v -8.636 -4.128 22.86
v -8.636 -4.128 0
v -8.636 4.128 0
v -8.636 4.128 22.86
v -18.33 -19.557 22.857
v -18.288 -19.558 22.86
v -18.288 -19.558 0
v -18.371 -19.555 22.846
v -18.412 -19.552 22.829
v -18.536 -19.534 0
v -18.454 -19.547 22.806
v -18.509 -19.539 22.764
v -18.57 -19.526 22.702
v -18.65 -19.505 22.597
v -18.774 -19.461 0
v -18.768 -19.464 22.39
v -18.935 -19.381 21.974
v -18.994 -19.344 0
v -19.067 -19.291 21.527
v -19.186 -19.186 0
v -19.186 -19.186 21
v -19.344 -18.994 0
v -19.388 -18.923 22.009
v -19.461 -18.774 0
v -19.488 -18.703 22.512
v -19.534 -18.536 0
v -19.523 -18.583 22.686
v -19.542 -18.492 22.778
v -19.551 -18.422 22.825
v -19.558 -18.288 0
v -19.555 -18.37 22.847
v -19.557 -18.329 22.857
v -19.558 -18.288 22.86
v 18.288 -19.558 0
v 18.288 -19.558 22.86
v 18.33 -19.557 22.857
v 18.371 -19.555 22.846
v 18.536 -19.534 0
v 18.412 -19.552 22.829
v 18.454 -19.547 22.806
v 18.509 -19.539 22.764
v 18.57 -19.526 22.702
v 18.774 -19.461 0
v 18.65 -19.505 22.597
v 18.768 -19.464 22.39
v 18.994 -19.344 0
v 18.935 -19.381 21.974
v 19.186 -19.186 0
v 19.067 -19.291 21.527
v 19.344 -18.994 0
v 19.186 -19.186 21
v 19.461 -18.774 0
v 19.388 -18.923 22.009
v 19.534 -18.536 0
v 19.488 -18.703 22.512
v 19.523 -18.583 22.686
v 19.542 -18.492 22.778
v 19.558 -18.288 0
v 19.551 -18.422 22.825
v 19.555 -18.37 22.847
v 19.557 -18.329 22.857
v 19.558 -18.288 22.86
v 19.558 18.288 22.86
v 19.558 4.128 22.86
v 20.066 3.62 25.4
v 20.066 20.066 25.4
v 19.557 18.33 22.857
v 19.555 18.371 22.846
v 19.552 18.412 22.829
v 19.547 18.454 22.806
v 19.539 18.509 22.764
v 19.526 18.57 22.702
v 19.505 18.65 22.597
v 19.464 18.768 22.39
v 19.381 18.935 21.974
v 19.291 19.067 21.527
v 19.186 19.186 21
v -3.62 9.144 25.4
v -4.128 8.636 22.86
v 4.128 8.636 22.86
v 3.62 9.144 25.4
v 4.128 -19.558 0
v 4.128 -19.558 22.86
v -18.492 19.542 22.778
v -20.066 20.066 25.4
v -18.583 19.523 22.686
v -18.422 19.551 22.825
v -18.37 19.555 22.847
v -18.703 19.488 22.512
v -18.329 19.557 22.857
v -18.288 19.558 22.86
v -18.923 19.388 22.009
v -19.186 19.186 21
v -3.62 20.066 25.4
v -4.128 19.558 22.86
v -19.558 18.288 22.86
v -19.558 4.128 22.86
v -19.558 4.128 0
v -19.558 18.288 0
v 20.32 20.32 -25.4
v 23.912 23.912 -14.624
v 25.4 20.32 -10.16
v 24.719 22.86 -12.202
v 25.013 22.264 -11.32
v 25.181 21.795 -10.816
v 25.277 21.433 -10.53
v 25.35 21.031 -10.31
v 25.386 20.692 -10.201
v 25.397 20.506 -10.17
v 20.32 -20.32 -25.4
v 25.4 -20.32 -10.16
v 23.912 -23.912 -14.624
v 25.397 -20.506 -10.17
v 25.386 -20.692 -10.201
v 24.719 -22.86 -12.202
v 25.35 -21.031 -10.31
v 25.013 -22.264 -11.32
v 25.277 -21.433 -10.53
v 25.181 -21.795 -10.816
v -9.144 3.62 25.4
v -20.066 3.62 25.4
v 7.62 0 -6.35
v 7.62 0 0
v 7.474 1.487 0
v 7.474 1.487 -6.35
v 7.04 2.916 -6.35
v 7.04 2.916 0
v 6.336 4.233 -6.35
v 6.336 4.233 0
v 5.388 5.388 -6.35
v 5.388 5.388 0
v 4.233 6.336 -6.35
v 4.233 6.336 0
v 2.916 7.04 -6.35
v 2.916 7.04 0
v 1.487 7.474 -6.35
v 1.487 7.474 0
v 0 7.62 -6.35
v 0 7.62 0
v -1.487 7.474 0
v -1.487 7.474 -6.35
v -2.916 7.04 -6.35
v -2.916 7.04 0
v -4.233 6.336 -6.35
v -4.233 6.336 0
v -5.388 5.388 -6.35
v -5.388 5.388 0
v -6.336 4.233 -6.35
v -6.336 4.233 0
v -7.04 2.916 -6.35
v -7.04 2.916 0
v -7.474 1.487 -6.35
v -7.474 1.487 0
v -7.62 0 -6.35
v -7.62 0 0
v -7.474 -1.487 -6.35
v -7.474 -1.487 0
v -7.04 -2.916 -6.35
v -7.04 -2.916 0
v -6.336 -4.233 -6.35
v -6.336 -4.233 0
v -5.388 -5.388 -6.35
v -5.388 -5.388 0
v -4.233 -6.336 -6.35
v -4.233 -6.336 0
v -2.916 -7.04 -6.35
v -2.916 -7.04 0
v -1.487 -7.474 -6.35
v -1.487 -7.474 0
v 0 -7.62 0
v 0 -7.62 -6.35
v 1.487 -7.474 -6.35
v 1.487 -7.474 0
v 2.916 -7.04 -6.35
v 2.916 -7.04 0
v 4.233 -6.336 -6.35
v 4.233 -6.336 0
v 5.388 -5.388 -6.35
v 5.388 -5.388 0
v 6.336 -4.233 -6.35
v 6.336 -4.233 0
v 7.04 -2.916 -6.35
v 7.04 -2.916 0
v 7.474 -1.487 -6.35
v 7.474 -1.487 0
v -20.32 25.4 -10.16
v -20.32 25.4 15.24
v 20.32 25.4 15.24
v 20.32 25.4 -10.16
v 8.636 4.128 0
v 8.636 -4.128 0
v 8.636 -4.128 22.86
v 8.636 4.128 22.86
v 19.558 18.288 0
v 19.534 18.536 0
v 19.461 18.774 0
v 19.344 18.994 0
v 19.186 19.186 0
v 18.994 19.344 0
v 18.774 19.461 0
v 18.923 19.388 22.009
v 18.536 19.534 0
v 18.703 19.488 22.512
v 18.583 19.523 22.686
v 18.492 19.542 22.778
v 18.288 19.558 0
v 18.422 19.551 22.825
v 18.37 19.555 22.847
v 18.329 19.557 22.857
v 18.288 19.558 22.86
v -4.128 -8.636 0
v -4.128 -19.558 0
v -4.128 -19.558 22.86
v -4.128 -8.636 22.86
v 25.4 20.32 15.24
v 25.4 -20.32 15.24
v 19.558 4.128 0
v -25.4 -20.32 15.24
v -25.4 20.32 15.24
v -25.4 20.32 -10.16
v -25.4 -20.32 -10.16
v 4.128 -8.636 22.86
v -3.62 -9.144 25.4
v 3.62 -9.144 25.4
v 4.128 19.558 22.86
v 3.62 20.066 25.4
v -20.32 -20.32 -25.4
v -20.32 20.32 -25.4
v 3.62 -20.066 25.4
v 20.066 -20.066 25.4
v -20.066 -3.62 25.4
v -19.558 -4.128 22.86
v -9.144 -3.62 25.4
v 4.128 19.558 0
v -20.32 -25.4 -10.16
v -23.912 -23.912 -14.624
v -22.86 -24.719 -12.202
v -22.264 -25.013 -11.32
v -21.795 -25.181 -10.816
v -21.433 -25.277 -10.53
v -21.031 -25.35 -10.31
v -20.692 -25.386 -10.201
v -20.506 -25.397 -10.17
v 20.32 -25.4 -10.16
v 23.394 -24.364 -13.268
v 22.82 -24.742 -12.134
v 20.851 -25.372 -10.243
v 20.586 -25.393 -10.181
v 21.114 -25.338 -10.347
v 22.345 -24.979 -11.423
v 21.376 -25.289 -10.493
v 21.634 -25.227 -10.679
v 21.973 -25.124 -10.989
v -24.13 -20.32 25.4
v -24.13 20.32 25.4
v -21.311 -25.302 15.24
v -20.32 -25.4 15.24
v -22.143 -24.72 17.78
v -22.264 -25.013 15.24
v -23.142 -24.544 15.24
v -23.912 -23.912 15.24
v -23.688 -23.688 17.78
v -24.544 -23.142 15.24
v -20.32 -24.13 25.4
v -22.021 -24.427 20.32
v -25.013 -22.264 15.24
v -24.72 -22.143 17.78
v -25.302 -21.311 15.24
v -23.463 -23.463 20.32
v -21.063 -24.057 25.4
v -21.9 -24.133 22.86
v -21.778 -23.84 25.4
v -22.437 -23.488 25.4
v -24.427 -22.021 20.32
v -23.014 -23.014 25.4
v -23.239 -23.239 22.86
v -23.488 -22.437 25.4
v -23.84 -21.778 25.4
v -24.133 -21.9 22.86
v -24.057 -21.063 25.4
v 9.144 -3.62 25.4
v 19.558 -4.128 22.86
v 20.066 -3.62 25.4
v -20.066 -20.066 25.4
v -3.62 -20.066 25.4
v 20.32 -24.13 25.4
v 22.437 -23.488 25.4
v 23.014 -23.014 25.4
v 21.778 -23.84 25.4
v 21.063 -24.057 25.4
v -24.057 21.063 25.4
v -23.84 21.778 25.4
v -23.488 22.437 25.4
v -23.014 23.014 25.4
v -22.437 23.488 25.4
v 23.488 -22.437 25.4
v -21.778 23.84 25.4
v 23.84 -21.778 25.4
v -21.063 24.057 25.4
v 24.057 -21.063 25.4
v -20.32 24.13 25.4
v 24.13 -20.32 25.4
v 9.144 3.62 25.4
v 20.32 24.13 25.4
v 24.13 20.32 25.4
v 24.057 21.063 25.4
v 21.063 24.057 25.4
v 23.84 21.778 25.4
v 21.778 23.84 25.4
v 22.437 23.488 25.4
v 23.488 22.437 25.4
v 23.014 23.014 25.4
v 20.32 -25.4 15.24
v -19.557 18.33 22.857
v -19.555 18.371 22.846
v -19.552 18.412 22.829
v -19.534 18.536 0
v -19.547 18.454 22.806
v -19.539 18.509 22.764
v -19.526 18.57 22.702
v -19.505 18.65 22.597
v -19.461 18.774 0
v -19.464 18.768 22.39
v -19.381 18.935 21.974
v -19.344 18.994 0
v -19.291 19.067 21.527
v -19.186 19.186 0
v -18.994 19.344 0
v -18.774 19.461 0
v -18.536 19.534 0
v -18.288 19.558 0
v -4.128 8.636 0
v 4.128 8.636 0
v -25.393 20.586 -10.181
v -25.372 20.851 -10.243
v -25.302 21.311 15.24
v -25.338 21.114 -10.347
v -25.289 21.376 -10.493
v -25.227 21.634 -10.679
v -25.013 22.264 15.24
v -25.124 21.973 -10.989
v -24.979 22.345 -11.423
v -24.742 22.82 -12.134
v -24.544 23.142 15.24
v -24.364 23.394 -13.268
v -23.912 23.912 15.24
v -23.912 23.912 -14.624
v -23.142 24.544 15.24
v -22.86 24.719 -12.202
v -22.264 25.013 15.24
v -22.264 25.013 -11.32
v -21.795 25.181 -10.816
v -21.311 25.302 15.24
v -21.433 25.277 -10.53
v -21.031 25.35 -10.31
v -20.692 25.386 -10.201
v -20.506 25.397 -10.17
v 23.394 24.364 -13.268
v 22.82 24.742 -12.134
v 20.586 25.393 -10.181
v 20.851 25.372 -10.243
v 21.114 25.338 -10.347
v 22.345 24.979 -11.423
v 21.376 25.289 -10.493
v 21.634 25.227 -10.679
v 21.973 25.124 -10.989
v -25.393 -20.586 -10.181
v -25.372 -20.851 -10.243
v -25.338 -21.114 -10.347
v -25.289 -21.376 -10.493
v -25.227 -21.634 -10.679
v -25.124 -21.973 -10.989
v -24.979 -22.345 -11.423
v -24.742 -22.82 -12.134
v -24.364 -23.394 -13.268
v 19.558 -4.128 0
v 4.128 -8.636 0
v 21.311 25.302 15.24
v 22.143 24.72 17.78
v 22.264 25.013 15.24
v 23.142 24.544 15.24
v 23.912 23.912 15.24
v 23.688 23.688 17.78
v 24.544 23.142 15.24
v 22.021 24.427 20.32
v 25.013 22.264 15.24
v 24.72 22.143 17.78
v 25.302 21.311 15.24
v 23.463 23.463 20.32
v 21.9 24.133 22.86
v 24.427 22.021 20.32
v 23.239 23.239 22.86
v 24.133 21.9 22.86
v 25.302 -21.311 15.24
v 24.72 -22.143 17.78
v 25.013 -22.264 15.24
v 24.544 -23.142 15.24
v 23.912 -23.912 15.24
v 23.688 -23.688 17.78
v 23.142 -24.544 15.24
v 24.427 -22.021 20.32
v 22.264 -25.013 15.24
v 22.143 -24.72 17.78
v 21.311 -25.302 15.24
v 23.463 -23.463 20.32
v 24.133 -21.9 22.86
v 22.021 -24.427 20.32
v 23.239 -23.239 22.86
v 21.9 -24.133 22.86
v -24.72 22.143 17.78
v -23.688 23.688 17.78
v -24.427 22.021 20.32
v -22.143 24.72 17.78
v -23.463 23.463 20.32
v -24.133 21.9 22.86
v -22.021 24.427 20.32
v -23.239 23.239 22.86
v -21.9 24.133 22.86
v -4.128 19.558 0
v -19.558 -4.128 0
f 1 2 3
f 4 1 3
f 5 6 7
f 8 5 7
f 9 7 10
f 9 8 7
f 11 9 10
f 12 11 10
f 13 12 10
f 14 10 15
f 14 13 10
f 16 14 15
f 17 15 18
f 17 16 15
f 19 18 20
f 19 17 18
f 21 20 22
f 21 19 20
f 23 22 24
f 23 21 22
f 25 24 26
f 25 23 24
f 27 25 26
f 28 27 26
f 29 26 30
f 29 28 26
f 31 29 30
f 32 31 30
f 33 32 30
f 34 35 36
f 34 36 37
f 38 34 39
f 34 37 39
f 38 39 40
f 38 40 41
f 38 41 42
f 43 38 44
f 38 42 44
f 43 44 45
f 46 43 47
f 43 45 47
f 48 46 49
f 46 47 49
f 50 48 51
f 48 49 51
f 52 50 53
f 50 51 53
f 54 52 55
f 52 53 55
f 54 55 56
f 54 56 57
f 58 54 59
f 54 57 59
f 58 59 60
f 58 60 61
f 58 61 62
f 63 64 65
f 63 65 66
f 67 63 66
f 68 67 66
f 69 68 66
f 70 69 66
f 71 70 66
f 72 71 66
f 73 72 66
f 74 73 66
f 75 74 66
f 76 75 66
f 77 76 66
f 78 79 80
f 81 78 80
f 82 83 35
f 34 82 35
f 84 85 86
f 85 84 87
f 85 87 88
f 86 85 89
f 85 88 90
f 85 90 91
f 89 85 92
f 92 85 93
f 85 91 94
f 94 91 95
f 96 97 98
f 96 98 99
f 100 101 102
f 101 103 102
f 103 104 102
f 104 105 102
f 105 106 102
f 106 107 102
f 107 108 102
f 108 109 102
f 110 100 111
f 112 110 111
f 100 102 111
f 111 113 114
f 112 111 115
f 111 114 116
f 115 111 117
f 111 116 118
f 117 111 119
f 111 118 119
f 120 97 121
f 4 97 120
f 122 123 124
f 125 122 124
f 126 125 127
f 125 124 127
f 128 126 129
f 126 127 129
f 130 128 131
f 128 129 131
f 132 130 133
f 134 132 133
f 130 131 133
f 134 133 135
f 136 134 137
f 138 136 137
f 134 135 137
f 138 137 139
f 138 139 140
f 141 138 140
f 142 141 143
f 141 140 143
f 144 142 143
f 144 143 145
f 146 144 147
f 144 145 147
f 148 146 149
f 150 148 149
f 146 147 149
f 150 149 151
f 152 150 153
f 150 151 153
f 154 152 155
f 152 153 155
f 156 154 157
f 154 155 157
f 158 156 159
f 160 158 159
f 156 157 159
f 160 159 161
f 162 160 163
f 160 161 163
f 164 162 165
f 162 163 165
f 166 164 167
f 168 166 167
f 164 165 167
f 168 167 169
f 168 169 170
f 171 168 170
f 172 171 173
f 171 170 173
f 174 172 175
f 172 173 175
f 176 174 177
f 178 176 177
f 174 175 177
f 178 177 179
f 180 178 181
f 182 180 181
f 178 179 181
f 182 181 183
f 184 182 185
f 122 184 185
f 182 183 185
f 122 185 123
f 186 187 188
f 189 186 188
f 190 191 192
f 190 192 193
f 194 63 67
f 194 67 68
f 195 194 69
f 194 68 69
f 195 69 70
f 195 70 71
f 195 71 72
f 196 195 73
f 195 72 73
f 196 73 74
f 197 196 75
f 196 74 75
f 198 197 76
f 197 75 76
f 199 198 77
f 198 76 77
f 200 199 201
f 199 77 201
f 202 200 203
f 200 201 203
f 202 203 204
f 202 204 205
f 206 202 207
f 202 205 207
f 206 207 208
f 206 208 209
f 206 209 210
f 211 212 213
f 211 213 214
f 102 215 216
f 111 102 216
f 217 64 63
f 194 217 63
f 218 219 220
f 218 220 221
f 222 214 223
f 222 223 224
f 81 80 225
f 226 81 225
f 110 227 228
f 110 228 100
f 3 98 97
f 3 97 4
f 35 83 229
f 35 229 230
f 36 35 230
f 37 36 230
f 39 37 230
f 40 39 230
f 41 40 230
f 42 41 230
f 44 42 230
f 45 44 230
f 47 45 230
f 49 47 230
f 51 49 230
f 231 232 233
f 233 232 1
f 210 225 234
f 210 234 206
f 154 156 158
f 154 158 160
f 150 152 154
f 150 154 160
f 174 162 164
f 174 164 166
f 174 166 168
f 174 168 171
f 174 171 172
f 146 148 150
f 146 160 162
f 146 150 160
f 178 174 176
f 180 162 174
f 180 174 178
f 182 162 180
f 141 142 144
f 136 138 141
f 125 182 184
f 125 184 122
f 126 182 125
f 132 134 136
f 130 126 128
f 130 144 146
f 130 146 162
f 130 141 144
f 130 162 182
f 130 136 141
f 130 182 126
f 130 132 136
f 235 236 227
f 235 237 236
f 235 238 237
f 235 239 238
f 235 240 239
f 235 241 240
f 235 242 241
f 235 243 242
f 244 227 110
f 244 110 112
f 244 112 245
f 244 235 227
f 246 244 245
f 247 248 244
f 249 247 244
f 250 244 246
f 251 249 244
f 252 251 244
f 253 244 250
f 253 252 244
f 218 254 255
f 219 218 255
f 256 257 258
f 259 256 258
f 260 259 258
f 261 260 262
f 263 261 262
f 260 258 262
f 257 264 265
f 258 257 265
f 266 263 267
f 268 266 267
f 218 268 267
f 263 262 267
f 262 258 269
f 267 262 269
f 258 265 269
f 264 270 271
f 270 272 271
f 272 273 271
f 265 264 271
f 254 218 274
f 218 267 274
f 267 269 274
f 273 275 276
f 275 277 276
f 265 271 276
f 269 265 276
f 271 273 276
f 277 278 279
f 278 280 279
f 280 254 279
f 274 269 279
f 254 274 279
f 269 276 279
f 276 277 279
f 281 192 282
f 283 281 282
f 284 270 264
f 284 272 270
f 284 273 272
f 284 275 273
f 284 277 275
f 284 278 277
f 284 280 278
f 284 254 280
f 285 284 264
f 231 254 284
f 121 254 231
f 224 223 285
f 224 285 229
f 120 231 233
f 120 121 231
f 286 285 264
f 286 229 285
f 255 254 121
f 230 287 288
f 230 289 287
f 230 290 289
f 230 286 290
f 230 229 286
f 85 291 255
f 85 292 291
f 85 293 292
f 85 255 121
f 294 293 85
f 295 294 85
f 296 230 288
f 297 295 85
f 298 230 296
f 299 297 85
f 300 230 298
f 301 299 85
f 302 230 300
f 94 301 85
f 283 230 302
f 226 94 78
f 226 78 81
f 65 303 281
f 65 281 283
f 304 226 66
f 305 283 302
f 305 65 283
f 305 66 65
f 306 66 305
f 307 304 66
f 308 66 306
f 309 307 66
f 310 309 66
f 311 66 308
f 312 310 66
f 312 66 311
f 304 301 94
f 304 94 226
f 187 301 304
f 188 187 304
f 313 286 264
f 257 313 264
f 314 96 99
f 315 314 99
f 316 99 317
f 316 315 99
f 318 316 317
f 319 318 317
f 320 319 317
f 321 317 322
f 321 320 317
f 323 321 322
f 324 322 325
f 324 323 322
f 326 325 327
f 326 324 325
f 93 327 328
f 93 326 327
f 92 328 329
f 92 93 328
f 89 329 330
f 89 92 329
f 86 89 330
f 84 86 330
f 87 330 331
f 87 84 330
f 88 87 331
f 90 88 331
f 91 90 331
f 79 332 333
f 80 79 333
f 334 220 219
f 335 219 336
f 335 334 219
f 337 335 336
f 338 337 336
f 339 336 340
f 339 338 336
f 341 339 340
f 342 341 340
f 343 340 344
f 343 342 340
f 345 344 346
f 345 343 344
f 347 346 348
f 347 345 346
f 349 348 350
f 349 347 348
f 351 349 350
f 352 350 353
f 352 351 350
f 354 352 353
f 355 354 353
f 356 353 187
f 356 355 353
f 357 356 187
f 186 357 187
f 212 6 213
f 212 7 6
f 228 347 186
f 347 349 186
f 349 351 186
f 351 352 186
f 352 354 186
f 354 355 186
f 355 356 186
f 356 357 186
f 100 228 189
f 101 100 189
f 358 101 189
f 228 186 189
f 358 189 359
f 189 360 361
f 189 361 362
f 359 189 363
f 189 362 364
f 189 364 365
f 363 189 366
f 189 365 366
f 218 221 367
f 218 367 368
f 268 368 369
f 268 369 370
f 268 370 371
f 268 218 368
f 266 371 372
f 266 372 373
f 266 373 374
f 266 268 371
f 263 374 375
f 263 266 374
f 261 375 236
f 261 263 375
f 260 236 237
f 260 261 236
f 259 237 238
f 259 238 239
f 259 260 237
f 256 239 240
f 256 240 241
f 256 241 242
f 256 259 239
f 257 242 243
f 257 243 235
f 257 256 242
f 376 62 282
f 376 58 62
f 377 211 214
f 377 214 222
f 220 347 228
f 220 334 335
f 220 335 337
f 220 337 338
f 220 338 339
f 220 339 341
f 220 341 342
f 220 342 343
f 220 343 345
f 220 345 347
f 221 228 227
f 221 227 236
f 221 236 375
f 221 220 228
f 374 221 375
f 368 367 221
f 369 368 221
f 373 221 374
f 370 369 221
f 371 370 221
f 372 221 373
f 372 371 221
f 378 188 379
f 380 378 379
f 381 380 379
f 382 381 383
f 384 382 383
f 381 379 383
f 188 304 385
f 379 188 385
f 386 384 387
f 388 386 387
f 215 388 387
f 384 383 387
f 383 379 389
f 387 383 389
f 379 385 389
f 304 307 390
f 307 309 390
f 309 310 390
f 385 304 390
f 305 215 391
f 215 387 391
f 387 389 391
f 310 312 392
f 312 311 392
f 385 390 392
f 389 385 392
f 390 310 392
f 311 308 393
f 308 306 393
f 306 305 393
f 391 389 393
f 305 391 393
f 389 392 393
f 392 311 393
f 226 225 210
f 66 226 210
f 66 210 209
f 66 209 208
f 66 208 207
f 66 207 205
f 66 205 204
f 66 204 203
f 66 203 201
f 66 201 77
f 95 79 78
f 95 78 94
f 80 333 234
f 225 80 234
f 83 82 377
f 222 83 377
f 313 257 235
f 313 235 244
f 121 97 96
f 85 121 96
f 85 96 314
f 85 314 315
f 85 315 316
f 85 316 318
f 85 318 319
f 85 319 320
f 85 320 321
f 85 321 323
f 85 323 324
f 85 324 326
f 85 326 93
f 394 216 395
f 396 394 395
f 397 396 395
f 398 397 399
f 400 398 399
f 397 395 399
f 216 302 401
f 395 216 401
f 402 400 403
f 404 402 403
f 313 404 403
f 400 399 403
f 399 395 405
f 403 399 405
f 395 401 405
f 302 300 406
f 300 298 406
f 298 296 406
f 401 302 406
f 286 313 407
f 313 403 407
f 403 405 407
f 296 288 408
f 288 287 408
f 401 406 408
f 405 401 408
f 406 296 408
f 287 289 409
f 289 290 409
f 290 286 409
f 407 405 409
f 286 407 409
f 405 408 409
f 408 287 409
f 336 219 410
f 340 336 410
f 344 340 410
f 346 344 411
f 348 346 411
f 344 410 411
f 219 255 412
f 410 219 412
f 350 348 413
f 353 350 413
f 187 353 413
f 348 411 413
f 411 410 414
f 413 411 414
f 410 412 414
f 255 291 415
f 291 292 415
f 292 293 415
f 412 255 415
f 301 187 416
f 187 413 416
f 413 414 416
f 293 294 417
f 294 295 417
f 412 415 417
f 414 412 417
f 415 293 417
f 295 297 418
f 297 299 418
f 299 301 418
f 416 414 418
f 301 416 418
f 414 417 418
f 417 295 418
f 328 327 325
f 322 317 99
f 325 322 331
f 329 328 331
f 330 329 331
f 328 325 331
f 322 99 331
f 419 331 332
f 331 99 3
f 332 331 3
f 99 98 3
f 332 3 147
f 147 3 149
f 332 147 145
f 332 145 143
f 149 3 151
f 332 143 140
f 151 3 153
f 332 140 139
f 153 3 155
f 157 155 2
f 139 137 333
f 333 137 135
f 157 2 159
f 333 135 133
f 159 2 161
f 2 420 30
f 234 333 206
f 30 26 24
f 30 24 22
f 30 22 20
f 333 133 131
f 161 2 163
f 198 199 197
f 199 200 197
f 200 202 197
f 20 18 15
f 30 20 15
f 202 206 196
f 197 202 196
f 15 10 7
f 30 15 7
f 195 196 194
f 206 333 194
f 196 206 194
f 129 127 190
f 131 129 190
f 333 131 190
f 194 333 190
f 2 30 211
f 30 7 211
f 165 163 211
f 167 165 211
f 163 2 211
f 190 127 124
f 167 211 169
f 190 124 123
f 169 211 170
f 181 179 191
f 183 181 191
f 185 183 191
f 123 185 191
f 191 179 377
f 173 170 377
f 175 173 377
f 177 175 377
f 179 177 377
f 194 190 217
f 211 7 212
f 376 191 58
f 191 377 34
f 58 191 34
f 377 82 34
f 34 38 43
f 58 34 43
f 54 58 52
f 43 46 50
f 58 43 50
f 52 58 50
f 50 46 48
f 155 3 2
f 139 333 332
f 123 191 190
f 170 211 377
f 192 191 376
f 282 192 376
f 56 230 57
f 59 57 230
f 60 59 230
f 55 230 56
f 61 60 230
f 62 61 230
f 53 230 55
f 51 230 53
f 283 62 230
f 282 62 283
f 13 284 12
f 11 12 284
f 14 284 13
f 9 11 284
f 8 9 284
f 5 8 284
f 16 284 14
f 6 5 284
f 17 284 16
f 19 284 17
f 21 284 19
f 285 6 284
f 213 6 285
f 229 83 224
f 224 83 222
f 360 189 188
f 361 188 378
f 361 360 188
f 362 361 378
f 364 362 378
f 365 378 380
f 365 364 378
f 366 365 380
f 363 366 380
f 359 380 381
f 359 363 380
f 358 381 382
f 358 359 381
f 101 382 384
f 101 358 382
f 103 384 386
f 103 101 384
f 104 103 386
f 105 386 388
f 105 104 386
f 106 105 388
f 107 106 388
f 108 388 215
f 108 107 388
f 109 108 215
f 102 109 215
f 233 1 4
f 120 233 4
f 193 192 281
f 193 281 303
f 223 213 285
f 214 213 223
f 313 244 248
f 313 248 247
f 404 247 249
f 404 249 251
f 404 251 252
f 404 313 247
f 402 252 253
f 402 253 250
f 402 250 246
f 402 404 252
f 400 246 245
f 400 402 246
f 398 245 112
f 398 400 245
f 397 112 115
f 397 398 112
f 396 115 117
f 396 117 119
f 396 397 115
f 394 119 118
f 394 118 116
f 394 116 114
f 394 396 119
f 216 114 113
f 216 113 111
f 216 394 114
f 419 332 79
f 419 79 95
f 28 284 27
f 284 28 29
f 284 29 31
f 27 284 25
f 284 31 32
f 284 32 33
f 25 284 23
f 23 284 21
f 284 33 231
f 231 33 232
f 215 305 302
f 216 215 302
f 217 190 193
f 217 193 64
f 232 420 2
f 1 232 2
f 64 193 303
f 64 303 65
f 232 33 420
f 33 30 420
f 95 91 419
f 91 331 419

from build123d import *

# Parameters (mm, degrees)
F0_W      = 50.8
F0_H      = 50.8
F0_W_2    = 39.116
F0_H_2    = 39.116
F1_DEPTH  = 25.4
F2_W      = 50.8
F2_H      = 50.8
F3_DEPTH  = 25.4
F4_W      = 10.922
F4_H      = 8.255
F4_W_2    = 8.255
F4_H_2    = 10.922
F5_DEPTH  = 25.4
F6_R      = 7.62
F7_DEPTH  = 6.35
F8_SIZE2  = 15.24
F8_SIZE   = 5.08
F9_R      = 5.08
F10_SIZE2 = 1.27
F10_SIZE  = 10.16
F11_SIZE2 = 2.54
F11_SIZE  = 0.508
F12_R     = 1.27


with BuildPart() as f1:
    # F0 (on Top) → F1 (new body)
    with BuildSketch(Plane.XY):
        Rectangle(F0_W, F0_H)
        Rectangle(F0_W_2, F0_H_2, mode=Mode.SUBTRACT)
    extrude(amount=F1_DEPTH)

    # F2 (on face) → F3 (join)
    with BuildSketch(Plane(origin=(0, 0, 0), x_dir=(1, 0, 0), z_dir=(0, 0, -1))):
        Rectangle(F2_W, F2_H)
    extrude(amount=F3_DEPTH)

    # F4 (on face) → F5 (join)
    with BuildSketch(Plane.XY):
        with Locations((-14.097, 0)):
            Rectangle(F4_W, F4_H)
        with Locations((0, 14.097)):
            Rectangle(F4_W_2, F4_H_2)
        with Locations((14.097, 0)):
            Rectangle(F4_W, F4_H)
        with Locations((0, -14.097)):
            Rectangle(F4_W_2, F4_H_2)
    extrude(amount=F5_DEPTH)

    # F6 (on face) → F7 (cut)
    with BuildSketch(Plane.XY):
        Circle(F6_R)
    extrude(amount=-F7_DEPTH, mode=Mode.SUBTRACT)

    # F8
    f8_edges = [f1.edges().sort_by_distance(p)[0] for p in [
        (25.4, 0, -25.4),
        (0, -25.4, -25.4),
        (-25.4, 0, -25.4),
        (0, 25.4, -25.4),
    ]]
    f8_side = f1.faces().sort_by_distance((0, 0, -25.4))[0]
    chamfer(f8_edges, length=F8_SIZE, length2=F8_SIZE2, reference=f8_side)

    # F9
    f9_edges = [f1.edges().sort_by_distance(p)[0] for p in [
        (25.4, -25.4, 7.62),
        (25.4, 25.4, 7.62),
        (-25.4, 25.4, 7.62),
        (-25.4, -25.4, 7.62),
    ]]
    fillet(f9_edges, radius=F9_R)

    # F10
    f10_edges = [f1.edges().sort_by_distance(p)[0] for p in [
        (0, 25.4, 25.4),
    ]]
    f10_side = f1.faces().sort_by_distance((0, 25.4, 7.62))[0]
    chamfer(f10_edges, length=F10_SIZE, length2=F10_SIZE2, reference=f10_side)

    # F11
    f11_edges = [f1.edges().sort_by_distance(p)[0] for p in [
        (11.84275, -19.558, 25.4),
        (4.1275, -14.097, 25.4),
        (0, -8.636, 25.4),
        (-4.1275, -14.097, 25.4),
        (-11.84275, -19.558, 25.4),
        (-19.558, -11.84275, 25.4),
        (-14.097, -4.1275, 25.4),
        (-8.636, 0, 25.4),
        (-14.097, 4.1275, 25.4),
        (-19.558, 11.84275, 25.4),
        (-11.84275, 19.558, 25.4),
        (-4.1275, 14.097, 25.4),
        (0, 8.636, 25.4),
        (4.1275, 14.097, 25.4),
        (11.84275, 19.558, 25.4),
        (19.558, 11.84275, 25.4),
        (14.097, 4.1275, 25.4),
        (14.097, -4.1275, 25.4),
        (19.558, -11.84275, 25.4),
        (8.636, 0, 25.4),
    ]]
    chamfer(f11_edges, length=F11_SIZE, length2=F11_SIZE2)

    # F12
    f12_edges = [f1.edges().sort_by_distance(p)[0] for p in [
        (-19.558, 19.558, 11.43),
        (19.558, 19.558, 11.43),
        (19.558, -19.558, 11.43),
        (-19.558, -19.558, 11.43),
    ]]
    fillet(f12_edges, radius=F12_R)


solid = f1.part
